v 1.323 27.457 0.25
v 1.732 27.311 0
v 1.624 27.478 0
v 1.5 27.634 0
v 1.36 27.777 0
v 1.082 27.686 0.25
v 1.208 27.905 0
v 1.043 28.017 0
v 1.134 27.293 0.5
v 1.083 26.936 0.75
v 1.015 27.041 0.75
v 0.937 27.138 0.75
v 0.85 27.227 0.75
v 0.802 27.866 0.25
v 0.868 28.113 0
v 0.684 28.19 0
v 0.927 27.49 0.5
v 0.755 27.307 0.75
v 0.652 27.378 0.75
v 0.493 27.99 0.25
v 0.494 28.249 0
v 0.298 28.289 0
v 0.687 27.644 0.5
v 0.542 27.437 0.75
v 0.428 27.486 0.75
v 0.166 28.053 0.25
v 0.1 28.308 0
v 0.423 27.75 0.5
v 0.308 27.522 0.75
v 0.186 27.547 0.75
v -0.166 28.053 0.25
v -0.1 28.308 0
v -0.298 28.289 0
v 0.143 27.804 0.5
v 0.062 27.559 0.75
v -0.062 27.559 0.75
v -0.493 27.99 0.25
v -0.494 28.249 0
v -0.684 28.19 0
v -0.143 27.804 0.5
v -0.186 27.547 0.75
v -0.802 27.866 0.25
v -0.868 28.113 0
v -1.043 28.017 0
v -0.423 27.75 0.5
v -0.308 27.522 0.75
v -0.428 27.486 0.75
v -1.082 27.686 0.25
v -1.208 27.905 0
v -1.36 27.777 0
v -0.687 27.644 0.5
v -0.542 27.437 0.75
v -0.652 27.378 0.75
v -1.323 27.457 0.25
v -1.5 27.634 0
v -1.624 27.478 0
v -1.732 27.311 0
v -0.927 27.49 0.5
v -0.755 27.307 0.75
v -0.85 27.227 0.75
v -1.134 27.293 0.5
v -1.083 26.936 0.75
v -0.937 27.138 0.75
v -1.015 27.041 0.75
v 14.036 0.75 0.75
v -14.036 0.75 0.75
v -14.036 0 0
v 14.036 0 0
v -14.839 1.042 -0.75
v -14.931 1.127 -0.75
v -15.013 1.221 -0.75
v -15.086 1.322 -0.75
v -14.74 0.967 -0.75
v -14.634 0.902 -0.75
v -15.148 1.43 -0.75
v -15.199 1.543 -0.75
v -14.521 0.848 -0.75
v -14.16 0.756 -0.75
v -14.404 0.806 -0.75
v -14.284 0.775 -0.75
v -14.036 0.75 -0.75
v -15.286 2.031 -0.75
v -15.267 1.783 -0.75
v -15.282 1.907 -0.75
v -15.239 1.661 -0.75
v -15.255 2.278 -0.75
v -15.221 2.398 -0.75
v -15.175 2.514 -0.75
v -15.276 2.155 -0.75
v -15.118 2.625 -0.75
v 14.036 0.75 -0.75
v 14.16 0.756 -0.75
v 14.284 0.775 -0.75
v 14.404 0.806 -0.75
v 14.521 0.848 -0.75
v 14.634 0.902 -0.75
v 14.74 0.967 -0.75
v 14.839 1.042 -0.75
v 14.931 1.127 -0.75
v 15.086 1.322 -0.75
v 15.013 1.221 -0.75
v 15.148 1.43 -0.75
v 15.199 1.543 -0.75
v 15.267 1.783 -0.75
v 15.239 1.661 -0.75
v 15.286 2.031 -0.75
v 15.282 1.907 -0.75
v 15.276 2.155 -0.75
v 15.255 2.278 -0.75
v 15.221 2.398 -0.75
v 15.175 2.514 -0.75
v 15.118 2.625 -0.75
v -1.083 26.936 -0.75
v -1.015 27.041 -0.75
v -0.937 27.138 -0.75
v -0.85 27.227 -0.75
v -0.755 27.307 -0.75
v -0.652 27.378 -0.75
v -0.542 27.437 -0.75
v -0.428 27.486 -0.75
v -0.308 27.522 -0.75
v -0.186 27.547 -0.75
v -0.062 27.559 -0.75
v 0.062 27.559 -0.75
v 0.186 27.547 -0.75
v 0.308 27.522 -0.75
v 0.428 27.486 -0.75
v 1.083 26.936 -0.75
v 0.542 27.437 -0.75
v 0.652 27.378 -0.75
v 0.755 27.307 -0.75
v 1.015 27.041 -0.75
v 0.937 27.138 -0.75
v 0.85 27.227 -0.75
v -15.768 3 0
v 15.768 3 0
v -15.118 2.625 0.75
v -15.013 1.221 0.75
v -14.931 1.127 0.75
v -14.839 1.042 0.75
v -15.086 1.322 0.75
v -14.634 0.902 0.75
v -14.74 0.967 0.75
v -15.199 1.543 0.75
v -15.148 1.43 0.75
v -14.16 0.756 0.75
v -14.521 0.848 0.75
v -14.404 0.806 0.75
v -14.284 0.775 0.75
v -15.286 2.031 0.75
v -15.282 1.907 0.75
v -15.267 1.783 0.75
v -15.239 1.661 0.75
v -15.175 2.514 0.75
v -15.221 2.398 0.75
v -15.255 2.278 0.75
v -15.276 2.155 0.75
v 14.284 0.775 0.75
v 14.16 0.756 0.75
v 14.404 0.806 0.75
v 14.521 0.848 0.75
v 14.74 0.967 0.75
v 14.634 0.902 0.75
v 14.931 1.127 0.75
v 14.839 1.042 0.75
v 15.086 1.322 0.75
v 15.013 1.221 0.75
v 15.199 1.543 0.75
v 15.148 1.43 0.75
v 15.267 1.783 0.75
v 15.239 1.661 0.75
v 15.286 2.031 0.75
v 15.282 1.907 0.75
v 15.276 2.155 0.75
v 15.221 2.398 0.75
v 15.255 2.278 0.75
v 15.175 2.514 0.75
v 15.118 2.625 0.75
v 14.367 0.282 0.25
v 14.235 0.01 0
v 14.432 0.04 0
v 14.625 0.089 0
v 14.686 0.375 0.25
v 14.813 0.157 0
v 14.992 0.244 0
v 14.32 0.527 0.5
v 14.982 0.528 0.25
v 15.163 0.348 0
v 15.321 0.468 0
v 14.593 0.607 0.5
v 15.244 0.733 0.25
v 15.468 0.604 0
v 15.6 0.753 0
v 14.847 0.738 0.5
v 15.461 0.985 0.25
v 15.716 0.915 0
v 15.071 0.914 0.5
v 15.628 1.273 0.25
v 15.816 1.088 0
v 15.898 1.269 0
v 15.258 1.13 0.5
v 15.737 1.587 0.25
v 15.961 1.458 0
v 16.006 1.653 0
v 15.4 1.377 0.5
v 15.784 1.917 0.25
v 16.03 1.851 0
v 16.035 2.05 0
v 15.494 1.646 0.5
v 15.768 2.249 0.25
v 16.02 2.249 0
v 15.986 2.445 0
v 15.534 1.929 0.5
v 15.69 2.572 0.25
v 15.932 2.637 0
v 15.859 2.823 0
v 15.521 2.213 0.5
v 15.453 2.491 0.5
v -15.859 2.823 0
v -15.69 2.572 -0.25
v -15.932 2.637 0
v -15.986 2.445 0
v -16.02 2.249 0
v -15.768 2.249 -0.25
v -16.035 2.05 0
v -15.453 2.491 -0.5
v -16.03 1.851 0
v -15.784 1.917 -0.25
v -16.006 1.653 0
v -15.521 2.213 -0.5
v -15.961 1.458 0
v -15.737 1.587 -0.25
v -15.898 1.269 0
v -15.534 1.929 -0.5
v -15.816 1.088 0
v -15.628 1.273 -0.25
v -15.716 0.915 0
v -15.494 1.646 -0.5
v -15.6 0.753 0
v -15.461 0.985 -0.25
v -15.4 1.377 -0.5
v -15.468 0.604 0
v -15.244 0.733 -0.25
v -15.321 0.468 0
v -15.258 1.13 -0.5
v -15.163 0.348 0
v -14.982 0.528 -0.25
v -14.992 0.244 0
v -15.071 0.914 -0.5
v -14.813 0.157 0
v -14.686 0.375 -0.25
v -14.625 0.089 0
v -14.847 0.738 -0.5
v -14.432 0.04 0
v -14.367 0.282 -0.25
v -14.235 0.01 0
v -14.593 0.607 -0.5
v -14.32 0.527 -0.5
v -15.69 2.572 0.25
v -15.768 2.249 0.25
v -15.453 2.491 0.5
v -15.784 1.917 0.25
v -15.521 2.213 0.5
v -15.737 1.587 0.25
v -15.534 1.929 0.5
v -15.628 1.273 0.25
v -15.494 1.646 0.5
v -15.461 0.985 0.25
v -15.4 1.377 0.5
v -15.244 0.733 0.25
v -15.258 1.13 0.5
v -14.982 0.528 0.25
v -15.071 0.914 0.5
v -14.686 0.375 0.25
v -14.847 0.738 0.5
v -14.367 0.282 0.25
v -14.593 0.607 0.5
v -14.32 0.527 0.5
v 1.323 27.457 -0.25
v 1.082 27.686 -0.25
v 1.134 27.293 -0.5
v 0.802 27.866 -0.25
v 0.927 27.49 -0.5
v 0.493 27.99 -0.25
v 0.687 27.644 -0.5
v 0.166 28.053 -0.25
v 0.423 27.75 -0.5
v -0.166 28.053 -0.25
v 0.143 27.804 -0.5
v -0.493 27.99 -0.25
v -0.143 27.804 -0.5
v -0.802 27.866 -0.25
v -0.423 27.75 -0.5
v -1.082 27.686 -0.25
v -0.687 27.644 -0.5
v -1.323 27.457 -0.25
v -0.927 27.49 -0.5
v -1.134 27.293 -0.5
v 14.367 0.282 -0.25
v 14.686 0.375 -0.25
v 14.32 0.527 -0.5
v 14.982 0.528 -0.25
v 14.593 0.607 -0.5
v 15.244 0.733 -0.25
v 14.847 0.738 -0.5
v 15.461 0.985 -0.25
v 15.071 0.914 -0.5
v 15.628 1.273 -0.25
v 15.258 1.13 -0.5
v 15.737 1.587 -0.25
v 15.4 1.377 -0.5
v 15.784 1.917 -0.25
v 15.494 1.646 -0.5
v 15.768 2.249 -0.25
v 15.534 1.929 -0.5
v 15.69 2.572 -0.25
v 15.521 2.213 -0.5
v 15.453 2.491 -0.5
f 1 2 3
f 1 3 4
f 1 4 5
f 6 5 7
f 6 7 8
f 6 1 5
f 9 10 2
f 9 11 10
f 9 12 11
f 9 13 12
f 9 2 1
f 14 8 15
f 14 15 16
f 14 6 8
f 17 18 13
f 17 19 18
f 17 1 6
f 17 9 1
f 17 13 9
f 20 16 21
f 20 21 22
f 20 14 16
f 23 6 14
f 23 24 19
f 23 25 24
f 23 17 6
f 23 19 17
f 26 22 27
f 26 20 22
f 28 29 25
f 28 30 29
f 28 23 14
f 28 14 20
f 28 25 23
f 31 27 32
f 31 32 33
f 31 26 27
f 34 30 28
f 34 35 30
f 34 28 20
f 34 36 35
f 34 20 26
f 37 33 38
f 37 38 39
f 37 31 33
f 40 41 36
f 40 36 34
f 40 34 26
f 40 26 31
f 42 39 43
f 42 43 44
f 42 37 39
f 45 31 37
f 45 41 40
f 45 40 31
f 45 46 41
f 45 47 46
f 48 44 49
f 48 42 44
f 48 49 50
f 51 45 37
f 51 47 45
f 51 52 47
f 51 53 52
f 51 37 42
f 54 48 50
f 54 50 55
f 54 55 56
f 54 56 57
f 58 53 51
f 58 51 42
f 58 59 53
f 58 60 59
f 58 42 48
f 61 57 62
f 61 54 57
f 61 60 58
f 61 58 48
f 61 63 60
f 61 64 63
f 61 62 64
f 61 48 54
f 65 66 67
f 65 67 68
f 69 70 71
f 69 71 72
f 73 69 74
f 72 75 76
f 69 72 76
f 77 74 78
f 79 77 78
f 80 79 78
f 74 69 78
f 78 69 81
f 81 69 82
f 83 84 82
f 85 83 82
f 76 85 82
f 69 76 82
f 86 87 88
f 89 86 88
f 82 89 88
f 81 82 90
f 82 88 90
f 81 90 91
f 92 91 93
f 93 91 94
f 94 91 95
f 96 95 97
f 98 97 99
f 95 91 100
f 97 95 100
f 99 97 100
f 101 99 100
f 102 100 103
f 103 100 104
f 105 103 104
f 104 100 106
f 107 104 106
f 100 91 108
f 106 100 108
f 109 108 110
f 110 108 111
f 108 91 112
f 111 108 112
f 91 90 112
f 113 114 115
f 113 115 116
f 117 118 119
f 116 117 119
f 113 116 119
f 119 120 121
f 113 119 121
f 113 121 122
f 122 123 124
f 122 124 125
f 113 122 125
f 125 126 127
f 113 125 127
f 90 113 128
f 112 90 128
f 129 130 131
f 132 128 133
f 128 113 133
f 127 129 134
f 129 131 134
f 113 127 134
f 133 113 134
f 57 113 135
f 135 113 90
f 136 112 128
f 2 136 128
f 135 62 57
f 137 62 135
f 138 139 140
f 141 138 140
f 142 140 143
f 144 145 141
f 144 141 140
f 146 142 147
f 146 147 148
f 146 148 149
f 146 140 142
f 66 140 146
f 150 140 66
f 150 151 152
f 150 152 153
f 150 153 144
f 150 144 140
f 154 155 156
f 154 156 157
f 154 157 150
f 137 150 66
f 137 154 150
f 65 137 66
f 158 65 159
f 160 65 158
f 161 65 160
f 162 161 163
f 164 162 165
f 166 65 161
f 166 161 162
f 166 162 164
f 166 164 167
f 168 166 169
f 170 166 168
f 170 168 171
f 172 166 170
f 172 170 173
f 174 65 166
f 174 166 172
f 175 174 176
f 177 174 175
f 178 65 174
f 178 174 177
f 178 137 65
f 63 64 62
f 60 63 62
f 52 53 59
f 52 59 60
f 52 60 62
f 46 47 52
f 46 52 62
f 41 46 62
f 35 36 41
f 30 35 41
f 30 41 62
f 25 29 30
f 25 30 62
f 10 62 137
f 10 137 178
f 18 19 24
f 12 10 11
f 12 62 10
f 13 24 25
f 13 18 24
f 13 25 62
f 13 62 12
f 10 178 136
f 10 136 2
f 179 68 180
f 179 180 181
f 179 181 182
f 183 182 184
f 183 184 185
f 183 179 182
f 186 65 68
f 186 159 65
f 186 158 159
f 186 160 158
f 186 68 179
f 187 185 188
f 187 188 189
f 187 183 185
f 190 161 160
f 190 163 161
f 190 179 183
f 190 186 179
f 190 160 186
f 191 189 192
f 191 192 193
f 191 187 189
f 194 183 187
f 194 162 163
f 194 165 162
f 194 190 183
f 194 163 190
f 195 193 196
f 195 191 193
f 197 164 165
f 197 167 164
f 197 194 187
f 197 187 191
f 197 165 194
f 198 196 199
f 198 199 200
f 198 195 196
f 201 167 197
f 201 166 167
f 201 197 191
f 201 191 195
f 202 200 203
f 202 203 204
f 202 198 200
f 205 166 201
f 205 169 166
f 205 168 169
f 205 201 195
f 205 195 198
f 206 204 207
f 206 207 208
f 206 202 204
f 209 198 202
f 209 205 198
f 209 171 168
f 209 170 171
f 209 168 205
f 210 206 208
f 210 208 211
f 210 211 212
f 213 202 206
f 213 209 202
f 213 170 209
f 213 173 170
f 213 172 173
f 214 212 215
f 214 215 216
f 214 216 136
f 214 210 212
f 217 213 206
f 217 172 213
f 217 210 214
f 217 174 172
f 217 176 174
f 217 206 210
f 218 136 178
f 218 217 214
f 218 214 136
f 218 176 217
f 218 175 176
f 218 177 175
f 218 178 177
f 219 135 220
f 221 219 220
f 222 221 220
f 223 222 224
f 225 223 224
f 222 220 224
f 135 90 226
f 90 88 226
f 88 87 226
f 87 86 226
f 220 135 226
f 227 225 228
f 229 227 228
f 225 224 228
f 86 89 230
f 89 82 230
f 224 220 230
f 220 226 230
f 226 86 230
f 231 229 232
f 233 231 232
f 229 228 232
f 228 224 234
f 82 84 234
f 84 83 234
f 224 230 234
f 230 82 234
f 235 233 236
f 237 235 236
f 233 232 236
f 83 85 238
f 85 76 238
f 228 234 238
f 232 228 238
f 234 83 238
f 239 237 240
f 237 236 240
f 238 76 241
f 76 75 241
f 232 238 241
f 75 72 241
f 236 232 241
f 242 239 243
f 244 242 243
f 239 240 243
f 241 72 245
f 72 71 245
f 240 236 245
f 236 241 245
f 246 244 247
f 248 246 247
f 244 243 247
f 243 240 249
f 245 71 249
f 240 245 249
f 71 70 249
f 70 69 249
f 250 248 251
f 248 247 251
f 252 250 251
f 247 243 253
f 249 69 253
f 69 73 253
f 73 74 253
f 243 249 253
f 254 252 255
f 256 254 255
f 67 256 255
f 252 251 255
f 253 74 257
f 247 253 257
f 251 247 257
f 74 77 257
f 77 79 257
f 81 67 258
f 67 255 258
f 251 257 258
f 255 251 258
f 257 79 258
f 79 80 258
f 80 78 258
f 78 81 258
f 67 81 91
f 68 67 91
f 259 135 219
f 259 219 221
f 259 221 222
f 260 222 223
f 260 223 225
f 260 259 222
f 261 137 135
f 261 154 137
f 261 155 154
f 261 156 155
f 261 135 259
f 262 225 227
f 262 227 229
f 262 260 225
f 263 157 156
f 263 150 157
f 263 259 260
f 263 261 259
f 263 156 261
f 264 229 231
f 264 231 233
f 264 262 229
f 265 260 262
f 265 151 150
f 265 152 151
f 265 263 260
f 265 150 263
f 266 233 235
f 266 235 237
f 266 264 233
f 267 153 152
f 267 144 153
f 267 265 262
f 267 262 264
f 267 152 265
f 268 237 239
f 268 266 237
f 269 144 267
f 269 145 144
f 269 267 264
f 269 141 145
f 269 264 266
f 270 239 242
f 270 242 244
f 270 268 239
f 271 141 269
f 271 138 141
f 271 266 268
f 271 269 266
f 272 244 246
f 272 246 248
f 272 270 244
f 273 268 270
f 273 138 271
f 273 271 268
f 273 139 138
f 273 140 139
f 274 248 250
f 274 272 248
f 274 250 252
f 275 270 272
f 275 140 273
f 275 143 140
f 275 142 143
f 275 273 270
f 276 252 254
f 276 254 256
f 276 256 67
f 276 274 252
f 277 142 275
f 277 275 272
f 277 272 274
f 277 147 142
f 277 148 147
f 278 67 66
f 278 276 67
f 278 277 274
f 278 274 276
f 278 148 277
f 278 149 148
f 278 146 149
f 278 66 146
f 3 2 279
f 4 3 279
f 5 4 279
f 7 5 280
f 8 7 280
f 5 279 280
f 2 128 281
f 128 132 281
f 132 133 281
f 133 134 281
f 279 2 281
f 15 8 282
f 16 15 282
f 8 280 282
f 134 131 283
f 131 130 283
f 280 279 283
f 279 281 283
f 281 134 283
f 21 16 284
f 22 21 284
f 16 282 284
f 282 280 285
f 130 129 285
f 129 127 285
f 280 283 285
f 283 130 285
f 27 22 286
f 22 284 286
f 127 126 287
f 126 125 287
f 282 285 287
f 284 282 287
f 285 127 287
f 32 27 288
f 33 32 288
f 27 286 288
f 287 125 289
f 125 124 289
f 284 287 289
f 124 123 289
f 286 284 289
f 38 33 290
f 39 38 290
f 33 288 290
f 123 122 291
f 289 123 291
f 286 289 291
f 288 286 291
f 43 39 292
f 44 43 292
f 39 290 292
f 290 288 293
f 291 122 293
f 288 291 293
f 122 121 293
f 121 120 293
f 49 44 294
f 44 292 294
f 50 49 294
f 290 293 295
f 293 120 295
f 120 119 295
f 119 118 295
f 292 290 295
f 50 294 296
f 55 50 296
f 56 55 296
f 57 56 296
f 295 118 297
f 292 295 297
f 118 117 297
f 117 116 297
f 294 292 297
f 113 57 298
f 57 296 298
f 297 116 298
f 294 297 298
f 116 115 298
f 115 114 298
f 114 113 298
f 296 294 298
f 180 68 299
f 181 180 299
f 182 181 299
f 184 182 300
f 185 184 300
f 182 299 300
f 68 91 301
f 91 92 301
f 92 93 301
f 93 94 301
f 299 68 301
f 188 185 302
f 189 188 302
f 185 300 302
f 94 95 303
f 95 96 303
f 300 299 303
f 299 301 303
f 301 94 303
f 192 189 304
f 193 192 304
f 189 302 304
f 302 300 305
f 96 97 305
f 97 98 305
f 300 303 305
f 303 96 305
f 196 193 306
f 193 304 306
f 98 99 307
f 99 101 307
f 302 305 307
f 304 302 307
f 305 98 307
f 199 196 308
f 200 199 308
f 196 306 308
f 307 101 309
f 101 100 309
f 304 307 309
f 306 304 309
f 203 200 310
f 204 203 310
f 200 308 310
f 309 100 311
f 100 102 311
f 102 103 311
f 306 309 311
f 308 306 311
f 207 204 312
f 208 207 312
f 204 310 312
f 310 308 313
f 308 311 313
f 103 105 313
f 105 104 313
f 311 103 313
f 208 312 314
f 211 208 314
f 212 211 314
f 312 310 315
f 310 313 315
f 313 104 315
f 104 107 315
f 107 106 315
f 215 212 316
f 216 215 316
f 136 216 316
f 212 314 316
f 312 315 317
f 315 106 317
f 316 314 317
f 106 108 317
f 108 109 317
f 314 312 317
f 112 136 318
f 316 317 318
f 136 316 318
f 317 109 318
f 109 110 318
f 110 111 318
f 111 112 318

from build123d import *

# Parameters (mm, degrees)
F1_DEPTH = 0.75
F2_SIZE  = 0.74999


# Not quite as in the source:
# - a fillet or chamfer is up to 0.001 mm smaller than in the source, because OpenCascade refuses the exact size


with BuildPart() as f1:
    # F0 (on Top) → F1 (new body, symmetric)
    with BuildSketch(Plane.XY):
        with BuildLine():
            ThreePointArc((1.7320508076, 27.3108891325), (0, 28.3108891325), (-1.7320508076, 27.3108891325))
            Line((-1.7320508076, 27.3108891325), (-15.7679491924, 3))
            ThreePointArc((-15.7679491924, 3), (-15.7679491924, 1), (-14.0358983849, 0))
            Line((-14.0358983849, 0), (14.0358983849, 0))
            ThreePointArc((14.0358983849, 0), (15.7679491924, 1), (15.7679491924, 3))
            Line((15.7679491924, 3), (1.7320508076, 27.3108891325))
        make_face()
    extrude(amount=F1_DEPTH, both=True)

    # F2 (size 0.75 in the source; OpenCascade refuses exactly that, so slightly less here)
    f2_edges = [f1.edges().sort_by_distance(p)[0] for p in [
        (8.75, 15.155445, 0.75),
        (8.75, 15.155445, -0.75),
        (0, 0, 0.75),
        (-8.75, 15.155445, 0.75),
        (0, 0, -0.75),
        (-8.75, 15.155445, -0.75),
    ]]
    chamfer(f2_edges, length=F2_SIZE)


solid = f1.part
